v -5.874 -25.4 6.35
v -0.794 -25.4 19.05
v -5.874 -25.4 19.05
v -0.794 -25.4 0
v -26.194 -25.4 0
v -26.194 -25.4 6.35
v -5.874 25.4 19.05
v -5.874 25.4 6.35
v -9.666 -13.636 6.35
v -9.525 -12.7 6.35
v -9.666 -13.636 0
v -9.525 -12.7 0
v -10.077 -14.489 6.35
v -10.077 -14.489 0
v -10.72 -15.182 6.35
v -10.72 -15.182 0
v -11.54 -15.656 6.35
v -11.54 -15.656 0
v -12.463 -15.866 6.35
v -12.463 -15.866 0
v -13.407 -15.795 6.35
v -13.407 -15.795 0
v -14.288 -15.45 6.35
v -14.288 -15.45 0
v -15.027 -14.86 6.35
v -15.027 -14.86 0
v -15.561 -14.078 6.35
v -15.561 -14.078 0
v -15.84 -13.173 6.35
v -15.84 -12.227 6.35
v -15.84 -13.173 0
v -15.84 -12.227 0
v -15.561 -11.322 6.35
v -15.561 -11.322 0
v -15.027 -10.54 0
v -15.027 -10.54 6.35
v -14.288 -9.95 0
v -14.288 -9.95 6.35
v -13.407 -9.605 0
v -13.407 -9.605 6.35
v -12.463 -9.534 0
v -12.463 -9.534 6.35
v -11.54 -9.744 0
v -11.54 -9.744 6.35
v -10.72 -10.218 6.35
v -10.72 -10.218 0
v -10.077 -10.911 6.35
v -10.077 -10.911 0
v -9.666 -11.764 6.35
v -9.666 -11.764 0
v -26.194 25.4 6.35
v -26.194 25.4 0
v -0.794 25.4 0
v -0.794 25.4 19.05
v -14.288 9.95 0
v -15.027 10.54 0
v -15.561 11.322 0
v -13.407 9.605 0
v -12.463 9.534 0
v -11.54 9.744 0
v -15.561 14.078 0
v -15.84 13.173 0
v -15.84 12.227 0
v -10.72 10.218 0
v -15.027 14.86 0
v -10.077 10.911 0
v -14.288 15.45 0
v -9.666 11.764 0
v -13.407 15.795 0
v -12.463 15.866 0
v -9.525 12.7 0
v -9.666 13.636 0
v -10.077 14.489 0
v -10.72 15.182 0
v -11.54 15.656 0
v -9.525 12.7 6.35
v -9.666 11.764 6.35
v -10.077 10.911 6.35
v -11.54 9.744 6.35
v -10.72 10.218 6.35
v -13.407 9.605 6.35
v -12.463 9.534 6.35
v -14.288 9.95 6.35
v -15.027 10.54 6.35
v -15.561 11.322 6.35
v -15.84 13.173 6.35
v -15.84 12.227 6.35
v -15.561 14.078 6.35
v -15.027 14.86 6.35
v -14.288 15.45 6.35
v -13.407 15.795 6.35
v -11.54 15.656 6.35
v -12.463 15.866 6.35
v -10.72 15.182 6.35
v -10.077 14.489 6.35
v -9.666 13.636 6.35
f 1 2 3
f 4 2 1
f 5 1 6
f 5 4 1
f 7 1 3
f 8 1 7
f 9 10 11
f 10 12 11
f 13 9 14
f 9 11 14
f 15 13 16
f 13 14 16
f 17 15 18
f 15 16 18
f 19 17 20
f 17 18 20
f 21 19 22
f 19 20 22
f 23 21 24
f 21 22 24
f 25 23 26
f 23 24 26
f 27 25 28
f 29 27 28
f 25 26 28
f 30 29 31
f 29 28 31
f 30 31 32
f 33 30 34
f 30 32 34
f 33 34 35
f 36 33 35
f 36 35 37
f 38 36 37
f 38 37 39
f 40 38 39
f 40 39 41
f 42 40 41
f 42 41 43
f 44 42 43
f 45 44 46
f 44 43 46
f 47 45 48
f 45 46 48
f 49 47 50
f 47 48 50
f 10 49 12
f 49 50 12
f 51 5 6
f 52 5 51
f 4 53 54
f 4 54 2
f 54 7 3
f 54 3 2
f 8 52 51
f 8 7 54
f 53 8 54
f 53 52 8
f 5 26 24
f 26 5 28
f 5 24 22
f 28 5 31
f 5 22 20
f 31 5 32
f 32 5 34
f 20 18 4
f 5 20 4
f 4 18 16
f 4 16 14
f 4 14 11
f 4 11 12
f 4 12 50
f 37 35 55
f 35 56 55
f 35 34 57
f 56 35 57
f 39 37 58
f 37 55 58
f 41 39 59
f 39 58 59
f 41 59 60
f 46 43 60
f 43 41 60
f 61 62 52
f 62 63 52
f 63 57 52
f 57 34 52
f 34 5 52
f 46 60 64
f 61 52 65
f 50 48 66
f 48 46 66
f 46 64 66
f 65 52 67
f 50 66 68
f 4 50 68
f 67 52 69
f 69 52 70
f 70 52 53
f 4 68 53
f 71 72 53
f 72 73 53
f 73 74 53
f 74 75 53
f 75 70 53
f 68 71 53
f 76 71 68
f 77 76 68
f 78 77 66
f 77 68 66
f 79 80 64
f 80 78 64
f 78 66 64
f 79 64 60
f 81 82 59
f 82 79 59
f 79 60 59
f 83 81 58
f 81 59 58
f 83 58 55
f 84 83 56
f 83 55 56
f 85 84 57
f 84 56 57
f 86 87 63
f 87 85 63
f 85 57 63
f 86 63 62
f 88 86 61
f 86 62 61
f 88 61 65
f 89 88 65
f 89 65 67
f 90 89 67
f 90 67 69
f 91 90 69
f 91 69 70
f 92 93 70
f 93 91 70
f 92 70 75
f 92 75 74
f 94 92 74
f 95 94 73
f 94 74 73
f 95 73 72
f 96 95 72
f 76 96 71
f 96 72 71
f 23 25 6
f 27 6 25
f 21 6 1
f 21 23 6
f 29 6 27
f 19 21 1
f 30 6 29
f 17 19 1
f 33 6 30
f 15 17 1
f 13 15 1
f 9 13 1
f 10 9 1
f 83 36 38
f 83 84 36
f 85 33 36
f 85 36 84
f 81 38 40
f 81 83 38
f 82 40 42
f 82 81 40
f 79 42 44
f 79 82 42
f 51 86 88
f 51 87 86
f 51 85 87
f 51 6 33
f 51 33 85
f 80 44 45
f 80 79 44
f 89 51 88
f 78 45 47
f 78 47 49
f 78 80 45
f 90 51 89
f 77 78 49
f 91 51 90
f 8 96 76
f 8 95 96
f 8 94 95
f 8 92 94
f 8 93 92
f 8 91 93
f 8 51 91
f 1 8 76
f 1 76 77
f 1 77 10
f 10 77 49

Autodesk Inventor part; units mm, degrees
ref_plane "YZ Plane" through (0, 0, 0) normal (1, 0, 0) x (0, 1, 0)
ref_plane "XZ Plane" through (0, 0, 0) normal (0, 1, 0) x (-1, 0, 0)
ref_plane "XY Plane" through (0, 0, 0) normal (0, 0, 1) x (1, 0, 0)
sketch "Sketch1" plane through (0, 0, 0) normal (0, 0, 1) x (1, 0, 0)
  line L0 (0, 2.4078) -> (0, -18.8352)
  line L1 (-12.7, 4.1621) -> (-12.7, -19.6361)
  line L2 (-20.3324, 0) -> (-11.9249, 0)
  circle A0 centre (-12.7, 12.7) radius 3.175
  circle A1 centre (-12.7, -12.7) radius 3.175
  line L3 (-26.1938, 25.4) -> (-0.7938, 25.4)
  line L4 (-0.7938, 25.4) -> (-0.7937, -25.4)
  line L5 (-0.7937, -25.4) -> (-26.1937, -25.4)
  line L6 (-26.1937, -25.4) -> (-26.1938, 25.4)
  point P0 (0, 0)
  dimension "d0" = 12.7
  dimension "d1" = 25.4
  dimension "d2" = 25.4
  dimension "d3" = 6.35
  dimension "d4" = 6.35
  dimension "d5" = 1.5875
  dimension "d6" = 25.4
  dimension "d7" = 50.8
  dimension "d8" = 12.7
extrude "Extrusion1" add sketch "Sketch1" along normal blind 6.35
sketch "Sketch2" plane through (0, 0, 6.35) normal (0, 0, 1) x (1, 0, 0)
  line L0 (-0.7938, 25.4) -> (-26.1938, 25.4) projected
  line L1 (-0.7937, -25.4) -> (-0.7938, 25.4) projected
  line L2 (-5.8738, 25.4) -> (-0.7937, 25.4)
  line L3 (-0.7937, 25.4) -> (-0.7937, -25.4)
  line L4 (-0.7937, -25.4) -> (-5.8737, -25.4)
  line L5 (-5.8737, -25.4) -> (-5.8738, 25.4)
  point P0 (0, 0)
  dimension "d11" = 5.08
extrude "Extrusion2" add sketch "Sketch2" along normal blind 12.7
properties part number "diffuser holder"
